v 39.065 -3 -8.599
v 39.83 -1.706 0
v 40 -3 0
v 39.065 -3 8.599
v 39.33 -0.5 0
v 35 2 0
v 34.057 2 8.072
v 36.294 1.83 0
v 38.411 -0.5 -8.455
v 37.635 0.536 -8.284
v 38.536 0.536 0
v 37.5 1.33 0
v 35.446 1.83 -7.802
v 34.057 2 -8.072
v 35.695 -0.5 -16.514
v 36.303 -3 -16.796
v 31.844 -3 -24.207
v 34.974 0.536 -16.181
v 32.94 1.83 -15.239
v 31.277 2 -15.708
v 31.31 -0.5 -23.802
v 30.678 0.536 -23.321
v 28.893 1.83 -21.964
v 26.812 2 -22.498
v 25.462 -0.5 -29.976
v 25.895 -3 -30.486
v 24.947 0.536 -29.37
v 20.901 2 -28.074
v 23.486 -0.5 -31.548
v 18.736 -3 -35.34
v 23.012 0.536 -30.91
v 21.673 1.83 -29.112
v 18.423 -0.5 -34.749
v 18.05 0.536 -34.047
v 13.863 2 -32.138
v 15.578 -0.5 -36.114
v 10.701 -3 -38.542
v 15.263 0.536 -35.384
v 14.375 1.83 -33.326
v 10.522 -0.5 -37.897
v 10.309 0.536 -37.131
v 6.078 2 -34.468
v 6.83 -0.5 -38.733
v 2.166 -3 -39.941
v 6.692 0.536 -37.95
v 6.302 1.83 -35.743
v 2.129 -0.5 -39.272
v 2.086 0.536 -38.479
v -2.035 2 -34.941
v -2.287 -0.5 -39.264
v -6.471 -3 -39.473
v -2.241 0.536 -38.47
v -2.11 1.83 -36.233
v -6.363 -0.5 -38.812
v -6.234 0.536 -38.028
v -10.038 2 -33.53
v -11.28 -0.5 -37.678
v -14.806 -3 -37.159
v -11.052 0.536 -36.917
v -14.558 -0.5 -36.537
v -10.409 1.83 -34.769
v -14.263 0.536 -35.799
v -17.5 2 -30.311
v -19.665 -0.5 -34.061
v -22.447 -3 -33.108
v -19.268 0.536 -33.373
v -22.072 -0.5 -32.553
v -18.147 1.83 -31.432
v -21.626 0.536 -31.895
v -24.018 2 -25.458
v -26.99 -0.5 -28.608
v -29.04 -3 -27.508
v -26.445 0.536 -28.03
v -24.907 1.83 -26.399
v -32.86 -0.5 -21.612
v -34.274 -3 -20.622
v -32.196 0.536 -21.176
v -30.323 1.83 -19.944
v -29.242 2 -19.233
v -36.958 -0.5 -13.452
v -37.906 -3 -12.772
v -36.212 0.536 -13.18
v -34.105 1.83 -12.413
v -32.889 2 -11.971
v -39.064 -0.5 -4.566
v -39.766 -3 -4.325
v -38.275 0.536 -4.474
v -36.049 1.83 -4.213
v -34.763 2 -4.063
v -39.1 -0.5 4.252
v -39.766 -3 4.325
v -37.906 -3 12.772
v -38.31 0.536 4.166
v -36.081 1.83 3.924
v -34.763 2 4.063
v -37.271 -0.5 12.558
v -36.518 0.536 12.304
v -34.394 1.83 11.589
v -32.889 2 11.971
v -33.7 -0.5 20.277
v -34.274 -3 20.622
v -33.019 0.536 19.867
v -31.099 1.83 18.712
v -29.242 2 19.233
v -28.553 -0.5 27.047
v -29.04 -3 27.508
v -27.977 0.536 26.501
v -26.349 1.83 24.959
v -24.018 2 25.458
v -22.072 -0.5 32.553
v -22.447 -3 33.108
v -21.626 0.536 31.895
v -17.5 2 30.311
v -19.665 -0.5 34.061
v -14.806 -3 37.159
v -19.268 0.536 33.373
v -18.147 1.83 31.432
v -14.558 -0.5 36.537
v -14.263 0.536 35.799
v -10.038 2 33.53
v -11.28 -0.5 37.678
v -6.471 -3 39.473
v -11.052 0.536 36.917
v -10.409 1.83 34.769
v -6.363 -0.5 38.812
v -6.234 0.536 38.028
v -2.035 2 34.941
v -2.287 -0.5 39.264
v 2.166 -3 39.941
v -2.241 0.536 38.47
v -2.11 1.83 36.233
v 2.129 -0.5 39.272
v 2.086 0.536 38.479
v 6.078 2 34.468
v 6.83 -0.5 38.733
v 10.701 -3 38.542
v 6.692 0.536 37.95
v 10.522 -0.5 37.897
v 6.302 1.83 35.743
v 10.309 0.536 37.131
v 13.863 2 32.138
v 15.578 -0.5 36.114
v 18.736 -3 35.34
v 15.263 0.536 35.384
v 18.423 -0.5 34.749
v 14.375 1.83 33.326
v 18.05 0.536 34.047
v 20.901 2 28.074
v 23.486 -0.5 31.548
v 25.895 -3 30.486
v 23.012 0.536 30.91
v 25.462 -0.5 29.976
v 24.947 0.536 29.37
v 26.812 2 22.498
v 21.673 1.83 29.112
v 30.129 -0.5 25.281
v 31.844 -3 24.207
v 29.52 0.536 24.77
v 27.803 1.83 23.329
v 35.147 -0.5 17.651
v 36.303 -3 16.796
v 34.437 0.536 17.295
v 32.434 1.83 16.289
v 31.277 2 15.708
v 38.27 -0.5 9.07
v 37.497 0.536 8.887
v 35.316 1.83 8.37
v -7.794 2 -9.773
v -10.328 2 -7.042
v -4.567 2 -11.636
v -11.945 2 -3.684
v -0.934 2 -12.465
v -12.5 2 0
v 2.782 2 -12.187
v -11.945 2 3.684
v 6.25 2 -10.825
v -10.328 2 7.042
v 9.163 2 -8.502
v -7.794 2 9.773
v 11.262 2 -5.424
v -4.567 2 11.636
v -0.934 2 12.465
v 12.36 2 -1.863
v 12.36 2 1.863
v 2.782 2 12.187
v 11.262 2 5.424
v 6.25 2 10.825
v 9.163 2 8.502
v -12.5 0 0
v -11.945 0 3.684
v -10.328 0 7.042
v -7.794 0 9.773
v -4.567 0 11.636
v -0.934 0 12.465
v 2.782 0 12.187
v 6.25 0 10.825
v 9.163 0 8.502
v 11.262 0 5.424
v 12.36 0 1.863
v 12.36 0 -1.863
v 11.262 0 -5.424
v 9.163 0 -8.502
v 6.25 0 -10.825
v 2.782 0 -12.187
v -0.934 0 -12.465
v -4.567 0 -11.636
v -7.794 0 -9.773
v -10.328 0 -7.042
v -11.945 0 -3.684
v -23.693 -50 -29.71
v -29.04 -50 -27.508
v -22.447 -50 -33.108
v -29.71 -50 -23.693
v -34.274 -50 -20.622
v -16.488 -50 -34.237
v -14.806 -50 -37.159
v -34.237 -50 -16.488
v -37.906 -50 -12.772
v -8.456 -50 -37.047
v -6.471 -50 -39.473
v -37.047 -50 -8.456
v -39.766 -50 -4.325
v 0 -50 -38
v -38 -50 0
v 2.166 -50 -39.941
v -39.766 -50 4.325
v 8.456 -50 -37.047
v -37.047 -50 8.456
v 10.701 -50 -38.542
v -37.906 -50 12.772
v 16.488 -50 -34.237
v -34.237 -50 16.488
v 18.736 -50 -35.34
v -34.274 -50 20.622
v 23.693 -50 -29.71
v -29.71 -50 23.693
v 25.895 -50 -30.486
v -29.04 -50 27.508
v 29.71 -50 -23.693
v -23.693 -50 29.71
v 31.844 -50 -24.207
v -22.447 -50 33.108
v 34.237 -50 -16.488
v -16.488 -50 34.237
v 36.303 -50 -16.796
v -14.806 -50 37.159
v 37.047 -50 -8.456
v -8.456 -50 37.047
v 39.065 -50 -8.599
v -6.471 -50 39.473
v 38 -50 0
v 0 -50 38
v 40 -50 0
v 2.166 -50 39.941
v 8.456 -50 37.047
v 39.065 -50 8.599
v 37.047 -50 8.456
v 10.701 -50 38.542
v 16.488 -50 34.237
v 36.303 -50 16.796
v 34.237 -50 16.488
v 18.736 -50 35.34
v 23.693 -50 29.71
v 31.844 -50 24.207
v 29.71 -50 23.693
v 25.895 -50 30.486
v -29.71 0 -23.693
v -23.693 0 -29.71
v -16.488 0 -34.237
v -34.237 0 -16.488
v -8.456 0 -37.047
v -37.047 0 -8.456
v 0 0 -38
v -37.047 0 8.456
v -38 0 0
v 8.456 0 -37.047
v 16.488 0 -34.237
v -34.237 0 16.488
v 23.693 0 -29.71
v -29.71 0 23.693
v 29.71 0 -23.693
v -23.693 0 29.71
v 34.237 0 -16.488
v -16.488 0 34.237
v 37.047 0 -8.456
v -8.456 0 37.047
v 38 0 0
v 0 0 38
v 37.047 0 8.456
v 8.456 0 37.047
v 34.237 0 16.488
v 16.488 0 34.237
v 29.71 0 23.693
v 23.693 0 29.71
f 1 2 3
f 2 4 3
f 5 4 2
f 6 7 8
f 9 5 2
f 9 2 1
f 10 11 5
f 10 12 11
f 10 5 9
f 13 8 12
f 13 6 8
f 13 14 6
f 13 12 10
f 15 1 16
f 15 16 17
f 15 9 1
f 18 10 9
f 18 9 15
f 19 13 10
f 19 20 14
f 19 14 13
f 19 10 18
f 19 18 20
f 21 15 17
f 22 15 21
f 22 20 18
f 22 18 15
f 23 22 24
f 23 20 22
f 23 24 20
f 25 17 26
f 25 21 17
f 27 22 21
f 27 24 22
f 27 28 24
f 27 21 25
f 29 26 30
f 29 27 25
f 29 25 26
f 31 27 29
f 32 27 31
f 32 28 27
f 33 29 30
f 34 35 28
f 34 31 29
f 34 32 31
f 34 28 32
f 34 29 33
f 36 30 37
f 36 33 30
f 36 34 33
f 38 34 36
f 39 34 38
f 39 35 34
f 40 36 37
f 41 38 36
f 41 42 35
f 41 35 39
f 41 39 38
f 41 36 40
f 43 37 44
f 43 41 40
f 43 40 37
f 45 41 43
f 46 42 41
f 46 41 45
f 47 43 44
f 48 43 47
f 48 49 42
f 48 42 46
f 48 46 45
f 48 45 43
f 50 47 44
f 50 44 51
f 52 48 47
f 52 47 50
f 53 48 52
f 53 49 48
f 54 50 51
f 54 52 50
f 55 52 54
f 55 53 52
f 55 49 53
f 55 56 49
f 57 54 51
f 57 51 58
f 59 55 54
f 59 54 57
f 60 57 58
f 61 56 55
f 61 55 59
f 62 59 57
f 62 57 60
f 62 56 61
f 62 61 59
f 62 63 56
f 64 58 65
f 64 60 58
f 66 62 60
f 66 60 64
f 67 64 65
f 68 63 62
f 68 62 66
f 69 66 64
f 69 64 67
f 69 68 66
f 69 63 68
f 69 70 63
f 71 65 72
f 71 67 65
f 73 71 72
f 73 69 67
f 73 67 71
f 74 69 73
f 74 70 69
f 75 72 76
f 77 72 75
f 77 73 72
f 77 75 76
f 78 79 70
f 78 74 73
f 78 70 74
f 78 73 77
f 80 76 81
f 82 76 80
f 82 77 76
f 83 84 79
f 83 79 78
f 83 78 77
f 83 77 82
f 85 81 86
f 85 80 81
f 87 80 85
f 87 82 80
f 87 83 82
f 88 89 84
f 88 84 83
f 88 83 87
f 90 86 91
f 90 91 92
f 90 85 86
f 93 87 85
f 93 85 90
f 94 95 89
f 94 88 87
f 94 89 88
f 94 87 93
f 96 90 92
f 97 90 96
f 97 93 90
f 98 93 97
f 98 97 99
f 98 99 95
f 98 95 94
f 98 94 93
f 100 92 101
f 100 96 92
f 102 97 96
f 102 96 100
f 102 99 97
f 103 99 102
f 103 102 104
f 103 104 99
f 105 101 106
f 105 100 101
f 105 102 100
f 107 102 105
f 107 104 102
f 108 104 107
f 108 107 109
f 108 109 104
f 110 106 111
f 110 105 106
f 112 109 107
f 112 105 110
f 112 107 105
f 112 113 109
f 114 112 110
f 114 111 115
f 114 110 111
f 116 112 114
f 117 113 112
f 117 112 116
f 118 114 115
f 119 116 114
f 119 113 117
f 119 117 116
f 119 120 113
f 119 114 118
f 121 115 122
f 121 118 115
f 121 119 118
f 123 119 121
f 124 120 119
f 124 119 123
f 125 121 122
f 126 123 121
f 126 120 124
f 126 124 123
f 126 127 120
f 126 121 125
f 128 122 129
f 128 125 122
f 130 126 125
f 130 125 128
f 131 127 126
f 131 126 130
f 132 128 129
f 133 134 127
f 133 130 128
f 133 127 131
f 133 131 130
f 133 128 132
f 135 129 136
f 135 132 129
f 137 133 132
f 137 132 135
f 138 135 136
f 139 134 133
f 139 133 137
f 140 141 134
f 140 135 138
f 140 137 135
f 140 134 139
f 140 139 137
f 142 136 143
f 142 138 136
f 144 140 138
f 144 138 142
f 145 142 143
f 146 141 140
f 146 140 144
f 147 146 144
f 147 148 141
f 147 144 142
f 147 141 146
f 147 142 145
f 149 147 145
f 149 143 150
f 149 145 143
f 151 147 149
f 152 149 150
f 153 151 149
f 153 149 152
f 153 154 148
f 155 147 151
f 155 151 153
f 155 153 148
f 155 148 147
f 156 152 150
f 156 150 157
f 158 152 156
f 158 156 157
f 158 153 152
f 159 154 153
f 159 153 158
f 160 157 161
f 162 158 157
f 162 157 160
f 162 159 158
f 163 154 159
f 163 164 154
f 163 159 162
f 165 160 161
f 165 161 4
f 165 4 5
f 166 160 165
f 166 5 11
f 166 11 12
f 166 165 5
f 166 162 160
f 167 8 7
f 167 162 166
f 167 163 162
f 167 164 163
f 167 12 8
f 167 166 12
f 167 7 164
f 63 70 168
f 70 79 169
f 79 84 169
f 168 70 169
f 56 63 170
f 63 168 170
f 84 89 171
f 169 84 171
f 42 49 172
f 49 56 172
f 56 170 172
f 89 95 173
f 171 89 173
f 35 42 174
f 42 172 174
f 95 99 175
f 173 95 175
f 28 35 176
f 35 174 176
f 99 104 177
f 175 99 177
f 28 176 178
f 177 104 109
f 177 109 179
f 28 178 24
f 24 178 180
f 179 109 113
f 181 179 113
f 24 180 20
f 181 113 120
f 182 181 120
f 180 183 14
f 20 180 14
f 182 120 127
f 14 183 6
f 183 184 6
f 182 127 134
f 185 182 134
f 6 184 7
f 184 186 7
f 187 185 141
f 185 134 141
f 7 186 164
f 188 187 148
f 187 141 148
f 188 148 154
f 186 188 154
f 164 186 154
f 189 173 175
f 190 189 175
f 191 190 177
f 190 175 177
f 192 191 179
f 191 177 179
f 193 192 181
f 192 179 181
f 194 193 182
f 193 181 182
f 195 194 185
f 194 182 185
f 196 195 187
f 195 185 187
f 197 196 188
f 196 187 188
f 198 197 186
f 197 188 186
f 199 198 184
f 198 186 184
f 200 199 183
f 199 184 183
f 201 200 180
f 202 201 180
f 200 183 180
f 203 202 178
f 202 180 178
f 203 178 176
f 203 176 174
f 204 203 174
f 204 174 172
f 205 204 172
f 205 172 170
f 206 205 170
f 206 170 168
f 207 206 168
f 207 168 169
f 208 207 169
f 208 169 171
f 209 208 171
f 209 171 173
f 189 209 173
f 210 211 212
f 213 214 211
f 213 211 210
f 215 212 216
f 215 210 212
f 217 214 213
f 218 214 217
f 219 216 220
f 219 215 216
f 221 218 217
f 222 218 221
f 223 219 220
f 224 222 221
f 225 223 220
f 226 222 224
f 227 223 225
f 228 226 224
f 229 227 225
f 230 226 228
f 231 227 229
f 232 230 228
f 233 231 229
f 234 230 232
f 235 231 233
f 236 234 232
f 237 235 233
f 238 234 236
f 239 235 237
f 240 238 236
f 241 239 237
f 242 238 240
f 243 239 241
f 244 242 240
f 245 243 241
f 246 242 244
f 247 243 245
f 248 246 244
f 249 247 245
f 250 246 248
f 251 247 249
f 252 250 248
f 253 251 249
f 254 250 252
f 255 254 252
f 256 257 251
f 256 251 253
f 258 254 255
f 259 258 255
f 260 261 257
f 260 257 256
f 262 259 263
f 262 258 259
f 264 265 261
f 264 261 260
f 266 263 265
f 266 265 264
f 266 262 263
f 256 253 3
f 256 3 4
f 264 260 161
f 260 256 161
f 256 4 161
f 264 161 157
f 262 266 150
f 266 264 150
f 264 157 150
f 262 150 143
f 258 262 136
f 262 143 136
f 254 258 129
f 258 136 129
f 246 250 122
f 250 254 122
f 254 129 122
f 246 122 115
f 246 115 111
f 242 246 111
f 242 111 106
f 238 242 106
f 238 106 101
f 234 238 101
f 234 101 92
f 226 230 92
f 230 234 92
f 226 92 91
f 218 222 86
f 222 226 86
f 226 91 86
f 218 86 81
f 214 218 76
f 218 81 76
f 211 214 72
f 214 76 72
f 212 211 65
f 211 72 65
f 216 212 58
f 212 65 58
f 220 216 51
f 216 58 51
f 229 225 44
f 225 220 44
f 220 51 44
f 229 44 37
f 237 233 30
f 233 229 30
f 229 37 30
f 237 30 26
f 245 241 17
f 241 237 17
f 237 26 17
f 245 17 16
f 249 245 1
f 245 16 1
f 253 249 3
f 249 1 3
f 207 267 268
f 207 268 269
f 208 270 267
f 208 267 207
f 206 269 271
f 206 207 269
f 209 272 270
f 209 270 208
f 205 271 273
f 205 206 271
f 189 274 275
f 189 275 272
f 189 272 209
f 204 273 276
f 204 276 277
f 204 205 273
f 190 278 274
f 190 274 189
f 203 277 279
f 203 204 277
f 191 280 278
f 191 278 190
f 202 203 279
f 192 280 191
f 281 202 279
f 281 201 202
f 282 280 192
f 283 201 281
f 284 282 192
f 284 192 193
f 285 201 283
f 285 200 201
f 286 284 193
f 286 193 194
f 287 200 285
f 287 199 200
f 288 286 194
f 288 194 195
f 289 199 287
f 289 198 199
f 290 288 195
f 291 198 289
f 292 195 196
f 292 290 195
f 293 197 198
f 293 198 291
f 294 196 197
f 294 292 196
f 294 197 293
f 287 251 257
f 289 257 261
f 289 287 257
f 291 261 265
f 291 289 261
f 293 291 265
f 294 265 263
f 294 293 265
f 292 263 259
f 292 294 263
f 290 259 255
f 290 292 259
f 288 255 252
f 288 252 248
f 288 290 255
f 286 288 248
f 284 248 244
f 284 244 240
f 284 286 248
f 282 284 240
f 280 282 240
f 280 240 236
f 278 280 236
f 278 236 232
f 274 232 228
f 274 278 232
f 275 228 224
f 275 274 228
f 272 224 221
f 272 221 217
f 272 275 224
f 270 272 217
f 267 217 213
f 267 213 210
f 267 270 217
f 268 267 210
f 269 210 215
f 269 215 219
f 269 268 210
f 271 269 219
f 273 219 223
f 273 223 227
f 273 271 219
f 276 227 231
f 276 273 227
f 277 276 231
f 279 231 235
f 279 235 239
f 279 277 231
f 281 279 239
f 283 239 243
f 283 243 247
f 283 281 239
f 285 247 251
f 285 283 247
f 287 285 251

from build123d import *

# Parameters (mm, degrees)
F0_R     = 38
F1_DEPTH = 50
F2_T     = 2
F3_R     = 12.5
F4_DEPTH = 52.001
F5_R     = 5


with BuildPart() as f1:
    # F0 (on Front) → F1 (new body)
    with BuildSketch(Plane.XZ):
        Circle(F0_R)
    extrude(amount=F1_DEPTH)

    # F2
    f2_openings = [f1.faces().sort_by_distance(p)[0] for p in [
        (0, -50, 0),
    ]]
    offset(amount=F2_T, openings=f2_openings, kind=Kind.INTERSECTION)

    # F3 (on face) → F4 (cut, through all)
    with BuildSketch(Plane(origin=(0, 2, 0), x_dir=(-1, 0, 0), z_dir=(0, 1, 0))):
        Circle(F3_R)
    extrude(amount=-F4_DEPTH, mode=Mode.SUBTRACT)

    # F5
    f5_edges = [f1.edges().sort_by_distance(p)[0] for p in [
        (-40, 2, 0),
    ]]
    fillet(f5_edges, radius=F5_R)


solid = f1.part
